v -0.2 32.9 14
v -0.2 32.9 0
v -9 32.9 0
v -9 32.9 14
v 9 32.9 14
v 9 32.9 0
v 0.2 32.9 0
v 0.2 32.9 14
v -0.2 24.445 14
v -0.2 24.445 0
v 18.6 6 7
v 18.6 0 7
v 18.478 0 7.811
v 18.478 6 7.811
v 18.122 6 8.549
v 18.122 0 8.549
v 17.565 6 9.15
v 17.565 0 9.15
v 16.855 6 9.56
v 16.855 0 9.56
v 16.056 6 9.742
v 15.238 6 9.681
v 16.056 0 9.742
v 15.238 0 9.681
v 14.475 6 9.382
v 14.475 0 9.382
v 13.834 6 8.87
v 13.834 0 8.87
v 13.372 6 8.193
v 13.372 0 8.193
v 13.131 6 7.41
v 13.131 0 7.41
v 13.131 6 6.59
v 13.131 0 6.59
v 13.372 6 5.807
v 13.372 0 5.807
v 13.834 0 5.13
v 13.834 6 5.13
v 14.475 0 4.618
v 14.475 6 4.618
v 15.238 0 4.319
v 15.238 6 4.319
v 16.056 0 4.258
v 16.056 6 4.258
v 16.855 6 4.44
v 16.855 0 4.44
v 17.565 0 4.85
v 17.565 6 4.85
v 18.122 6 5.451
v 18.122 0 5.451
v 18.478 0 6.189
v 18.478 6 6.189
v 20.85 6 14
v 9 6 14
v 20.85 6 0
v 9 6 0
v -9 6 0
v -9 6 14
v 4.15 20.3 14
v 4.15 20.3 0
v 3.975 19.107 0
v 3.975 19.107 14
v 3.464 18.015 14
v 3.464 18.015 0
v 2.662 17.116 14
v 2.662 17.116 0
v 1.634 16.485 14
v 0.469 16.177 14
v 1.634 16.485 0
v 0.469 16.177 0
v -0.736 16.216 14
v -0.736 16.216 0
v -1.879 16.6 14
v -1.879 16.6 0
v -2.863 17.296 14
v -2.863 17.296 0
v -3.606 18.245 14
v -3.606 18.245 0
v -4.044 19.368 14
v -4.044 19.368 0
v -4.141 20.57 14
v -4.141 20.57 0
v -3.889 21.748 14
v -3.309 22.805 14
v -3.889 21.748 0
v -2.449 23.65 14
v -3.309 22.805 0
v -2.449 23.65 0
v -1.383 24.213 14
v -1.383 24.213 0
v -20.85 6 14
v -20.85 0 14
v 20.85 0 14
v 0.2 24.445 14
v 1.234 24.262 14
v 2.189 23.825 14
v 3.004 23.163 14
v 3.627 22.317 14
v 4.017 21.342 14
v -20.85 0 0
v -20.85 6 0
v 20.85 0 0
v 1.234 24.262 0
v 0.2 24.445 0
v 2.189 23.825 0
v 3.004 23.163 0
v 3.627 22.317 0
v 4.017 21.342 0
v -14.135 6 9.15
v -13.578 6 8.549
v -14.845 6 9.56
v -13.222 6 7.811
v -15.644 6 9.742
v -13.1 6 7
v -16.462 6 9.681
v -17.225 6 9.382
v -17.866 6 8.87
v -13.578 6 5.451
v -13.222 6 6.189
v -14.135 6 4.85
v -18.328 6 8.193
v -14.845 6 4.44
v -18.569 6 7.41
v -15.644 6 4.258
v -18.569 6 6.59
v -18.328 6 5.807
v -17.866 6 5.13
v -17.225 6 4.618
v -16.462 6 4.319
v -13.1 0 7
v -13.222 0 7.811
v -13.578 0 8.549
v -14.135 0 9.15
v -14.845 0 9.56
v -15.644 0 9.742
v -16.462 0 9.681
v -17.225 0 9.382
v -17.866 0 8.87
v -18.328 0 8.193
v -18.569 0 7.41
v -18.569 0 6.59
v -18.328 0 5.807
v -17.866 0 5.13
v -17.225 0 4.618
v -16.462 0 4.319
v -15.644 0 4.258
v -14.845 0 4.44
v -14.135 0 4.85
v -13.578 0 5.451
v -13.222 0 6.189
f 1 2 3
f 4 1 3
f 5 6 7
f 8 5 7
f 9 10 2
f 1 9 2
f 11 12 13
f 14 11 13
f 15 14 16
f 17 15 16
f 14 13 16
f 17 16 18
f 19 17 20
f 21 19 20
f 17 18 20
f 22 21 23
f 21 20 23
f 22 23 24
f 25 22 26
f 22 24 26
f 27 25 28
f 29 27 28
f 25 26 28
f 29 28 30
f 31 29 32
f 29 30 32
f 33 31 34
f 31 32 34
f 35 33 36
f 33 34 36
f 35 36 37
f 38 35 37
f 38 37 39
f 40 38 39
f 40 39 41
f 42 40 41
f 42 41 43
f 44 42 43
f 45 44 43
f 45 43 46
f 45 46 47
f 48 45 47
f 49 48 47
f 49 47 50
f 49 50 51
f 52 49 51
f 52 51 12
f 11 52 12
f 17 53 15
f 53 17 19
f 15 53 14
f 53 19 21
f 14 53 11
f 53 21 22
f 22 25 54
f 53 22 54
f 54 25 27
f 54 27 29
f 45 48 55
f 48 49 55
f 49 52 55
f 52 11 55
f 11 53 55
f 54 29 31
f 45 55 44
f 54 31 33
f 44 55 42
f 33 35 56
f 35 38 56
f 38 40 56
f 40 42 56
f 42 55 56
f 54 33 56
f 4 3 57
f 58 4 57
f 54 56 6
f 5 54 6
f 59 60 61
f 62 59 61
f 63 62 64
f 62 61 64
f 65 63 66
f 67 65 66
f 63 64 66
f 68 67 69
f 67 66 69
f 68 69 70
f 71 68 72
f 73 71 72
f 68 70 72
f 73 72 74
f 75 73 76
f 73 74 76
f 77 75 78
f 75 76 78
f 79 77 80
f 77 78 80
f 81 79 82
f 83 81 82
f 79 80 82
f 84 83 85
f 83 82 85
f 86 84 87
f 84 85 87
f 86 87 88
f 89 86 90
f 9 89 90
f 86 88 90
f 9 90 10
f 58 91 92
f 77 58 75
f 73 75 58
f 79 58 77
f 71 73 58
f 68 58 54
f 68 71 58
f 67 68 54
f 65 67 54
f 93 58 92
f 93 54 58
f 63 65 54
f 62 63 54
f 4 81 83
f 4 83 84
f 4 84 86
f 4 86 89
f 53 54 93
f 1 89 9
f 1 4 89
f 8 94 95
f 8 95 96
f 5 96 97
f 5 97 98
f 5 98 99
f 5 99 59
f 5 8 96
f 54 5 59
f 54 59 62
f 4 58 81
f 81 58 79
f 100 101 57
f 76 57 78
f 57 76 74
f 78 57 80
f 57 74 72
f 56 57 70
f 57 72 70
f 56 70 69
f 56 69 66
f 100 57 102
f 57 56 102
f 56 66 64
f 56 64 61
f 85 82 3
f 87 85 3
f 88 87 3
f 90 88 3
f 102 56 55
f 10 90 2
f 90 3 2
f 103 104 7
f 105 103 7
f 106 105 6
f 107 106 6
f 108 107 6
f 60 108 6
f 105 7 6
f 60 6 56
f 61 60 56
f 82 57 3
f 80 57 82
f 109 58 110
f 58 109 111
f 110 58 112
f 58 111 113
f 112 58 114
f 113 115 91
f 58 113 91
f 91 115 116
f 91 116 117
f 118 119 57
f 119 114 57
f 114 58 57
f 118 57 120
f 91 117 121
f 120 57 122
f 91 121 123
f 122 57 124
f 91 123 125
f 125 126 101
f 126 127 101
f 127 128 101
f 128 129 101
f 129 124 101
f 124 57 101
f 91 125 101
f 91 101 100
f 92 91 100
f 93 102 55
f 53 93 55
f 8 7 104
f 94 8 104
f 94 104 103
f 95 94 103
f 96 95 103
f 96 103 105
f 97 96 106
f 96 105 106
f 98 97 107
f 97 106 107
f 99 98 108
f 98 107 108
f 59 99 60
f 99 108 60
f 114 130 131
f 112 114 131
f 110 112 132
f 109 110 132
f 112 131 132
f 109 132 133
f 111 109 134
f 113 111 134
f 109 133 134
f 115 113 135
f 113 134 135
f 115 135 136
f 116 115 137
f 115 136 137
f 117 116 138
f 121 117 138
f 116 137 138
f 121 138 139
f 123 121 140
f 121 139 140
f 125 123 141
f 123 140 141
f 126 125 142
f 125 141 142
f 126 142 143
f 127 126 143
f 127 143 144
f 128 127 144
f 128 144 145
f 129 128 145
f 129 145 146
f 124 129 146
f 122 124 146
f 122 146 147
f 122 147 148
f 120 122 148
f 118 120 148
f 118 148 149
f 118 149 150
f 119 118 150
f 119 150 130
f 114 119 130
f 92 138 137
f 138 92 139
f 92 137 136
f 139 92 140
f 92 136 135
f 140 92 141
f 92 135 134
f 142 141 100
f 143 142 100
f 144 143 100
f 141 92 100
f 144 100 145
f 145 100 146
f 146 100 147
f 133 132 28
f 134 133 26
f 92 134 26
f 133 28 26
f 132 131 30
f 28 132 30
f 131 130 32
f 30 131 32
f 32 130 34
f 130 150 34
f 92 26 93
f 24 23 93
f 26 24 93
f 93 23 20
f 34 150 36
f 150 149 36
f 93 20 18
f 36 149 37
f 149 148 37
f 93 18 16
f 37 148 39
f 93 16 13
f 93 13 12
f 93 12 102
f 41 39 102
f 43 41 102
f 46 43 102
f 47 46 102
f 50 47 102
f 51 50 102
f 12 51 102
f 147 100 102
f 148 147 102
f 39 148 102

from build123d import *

# Parameters (mm, degrees)
BOSS_EXTRUDE1_DEPTH = 14
SKETCH2_R           = 2.75
CUT_EXTRUDE1_DEPTH  = 33.9


with BuildPart() as part:
    # Sketch1 → Boss-Extrude1 (new body)
    with BuildSketch(Plane.XY):
        with BuildLine():
            Line((-20.85, 6), (-20.85, 0))
            Line((-20.85, 0), (20.85, 0))
            Line((20.85, 0), (20.85, 6))
            Line((20.85, 6), (9, 6))
            Line((9, 6), (9, 32.9))
            Line((9, 32.9), (0.2, 32.9))
            Line((0.2, 32.9), (0.2, 24.445177921))
            ThreePointArc((0.2, 24.445177921), (3.004371815, 23.162909359), (4.15, 20.3))
            ThreePointArc((4.15, 20.3), (-2.862909359, 17.295628185), (-0.2, 24.445177921))
            Line((-0.2, 24.445177921), (-0.2, 32.9))
            Line((-0.2, 32.9), (-9, 32.9))
            Line((-9, 32.9), (-9, 6))
            Line((-9, 6), (-20.85, 6))
        make_face()
    extrude(amount=BOSS_EXTRUDE1_DEPTH)

    # Sketch2 → Cut-Extrude1 (cut, through all)
    with BuildSketch(Plane.XZ):
        with Locations((-15.85, 7)):
            Circle(SKETCH2_R)
        with Locations((15.85, 7)):
            Circle(SKETCH2_R)
    extrude(amount=-CUT_EXTRUDE1_DEPTH, mode=Mode.SUBTRACT)


solid = part.part
